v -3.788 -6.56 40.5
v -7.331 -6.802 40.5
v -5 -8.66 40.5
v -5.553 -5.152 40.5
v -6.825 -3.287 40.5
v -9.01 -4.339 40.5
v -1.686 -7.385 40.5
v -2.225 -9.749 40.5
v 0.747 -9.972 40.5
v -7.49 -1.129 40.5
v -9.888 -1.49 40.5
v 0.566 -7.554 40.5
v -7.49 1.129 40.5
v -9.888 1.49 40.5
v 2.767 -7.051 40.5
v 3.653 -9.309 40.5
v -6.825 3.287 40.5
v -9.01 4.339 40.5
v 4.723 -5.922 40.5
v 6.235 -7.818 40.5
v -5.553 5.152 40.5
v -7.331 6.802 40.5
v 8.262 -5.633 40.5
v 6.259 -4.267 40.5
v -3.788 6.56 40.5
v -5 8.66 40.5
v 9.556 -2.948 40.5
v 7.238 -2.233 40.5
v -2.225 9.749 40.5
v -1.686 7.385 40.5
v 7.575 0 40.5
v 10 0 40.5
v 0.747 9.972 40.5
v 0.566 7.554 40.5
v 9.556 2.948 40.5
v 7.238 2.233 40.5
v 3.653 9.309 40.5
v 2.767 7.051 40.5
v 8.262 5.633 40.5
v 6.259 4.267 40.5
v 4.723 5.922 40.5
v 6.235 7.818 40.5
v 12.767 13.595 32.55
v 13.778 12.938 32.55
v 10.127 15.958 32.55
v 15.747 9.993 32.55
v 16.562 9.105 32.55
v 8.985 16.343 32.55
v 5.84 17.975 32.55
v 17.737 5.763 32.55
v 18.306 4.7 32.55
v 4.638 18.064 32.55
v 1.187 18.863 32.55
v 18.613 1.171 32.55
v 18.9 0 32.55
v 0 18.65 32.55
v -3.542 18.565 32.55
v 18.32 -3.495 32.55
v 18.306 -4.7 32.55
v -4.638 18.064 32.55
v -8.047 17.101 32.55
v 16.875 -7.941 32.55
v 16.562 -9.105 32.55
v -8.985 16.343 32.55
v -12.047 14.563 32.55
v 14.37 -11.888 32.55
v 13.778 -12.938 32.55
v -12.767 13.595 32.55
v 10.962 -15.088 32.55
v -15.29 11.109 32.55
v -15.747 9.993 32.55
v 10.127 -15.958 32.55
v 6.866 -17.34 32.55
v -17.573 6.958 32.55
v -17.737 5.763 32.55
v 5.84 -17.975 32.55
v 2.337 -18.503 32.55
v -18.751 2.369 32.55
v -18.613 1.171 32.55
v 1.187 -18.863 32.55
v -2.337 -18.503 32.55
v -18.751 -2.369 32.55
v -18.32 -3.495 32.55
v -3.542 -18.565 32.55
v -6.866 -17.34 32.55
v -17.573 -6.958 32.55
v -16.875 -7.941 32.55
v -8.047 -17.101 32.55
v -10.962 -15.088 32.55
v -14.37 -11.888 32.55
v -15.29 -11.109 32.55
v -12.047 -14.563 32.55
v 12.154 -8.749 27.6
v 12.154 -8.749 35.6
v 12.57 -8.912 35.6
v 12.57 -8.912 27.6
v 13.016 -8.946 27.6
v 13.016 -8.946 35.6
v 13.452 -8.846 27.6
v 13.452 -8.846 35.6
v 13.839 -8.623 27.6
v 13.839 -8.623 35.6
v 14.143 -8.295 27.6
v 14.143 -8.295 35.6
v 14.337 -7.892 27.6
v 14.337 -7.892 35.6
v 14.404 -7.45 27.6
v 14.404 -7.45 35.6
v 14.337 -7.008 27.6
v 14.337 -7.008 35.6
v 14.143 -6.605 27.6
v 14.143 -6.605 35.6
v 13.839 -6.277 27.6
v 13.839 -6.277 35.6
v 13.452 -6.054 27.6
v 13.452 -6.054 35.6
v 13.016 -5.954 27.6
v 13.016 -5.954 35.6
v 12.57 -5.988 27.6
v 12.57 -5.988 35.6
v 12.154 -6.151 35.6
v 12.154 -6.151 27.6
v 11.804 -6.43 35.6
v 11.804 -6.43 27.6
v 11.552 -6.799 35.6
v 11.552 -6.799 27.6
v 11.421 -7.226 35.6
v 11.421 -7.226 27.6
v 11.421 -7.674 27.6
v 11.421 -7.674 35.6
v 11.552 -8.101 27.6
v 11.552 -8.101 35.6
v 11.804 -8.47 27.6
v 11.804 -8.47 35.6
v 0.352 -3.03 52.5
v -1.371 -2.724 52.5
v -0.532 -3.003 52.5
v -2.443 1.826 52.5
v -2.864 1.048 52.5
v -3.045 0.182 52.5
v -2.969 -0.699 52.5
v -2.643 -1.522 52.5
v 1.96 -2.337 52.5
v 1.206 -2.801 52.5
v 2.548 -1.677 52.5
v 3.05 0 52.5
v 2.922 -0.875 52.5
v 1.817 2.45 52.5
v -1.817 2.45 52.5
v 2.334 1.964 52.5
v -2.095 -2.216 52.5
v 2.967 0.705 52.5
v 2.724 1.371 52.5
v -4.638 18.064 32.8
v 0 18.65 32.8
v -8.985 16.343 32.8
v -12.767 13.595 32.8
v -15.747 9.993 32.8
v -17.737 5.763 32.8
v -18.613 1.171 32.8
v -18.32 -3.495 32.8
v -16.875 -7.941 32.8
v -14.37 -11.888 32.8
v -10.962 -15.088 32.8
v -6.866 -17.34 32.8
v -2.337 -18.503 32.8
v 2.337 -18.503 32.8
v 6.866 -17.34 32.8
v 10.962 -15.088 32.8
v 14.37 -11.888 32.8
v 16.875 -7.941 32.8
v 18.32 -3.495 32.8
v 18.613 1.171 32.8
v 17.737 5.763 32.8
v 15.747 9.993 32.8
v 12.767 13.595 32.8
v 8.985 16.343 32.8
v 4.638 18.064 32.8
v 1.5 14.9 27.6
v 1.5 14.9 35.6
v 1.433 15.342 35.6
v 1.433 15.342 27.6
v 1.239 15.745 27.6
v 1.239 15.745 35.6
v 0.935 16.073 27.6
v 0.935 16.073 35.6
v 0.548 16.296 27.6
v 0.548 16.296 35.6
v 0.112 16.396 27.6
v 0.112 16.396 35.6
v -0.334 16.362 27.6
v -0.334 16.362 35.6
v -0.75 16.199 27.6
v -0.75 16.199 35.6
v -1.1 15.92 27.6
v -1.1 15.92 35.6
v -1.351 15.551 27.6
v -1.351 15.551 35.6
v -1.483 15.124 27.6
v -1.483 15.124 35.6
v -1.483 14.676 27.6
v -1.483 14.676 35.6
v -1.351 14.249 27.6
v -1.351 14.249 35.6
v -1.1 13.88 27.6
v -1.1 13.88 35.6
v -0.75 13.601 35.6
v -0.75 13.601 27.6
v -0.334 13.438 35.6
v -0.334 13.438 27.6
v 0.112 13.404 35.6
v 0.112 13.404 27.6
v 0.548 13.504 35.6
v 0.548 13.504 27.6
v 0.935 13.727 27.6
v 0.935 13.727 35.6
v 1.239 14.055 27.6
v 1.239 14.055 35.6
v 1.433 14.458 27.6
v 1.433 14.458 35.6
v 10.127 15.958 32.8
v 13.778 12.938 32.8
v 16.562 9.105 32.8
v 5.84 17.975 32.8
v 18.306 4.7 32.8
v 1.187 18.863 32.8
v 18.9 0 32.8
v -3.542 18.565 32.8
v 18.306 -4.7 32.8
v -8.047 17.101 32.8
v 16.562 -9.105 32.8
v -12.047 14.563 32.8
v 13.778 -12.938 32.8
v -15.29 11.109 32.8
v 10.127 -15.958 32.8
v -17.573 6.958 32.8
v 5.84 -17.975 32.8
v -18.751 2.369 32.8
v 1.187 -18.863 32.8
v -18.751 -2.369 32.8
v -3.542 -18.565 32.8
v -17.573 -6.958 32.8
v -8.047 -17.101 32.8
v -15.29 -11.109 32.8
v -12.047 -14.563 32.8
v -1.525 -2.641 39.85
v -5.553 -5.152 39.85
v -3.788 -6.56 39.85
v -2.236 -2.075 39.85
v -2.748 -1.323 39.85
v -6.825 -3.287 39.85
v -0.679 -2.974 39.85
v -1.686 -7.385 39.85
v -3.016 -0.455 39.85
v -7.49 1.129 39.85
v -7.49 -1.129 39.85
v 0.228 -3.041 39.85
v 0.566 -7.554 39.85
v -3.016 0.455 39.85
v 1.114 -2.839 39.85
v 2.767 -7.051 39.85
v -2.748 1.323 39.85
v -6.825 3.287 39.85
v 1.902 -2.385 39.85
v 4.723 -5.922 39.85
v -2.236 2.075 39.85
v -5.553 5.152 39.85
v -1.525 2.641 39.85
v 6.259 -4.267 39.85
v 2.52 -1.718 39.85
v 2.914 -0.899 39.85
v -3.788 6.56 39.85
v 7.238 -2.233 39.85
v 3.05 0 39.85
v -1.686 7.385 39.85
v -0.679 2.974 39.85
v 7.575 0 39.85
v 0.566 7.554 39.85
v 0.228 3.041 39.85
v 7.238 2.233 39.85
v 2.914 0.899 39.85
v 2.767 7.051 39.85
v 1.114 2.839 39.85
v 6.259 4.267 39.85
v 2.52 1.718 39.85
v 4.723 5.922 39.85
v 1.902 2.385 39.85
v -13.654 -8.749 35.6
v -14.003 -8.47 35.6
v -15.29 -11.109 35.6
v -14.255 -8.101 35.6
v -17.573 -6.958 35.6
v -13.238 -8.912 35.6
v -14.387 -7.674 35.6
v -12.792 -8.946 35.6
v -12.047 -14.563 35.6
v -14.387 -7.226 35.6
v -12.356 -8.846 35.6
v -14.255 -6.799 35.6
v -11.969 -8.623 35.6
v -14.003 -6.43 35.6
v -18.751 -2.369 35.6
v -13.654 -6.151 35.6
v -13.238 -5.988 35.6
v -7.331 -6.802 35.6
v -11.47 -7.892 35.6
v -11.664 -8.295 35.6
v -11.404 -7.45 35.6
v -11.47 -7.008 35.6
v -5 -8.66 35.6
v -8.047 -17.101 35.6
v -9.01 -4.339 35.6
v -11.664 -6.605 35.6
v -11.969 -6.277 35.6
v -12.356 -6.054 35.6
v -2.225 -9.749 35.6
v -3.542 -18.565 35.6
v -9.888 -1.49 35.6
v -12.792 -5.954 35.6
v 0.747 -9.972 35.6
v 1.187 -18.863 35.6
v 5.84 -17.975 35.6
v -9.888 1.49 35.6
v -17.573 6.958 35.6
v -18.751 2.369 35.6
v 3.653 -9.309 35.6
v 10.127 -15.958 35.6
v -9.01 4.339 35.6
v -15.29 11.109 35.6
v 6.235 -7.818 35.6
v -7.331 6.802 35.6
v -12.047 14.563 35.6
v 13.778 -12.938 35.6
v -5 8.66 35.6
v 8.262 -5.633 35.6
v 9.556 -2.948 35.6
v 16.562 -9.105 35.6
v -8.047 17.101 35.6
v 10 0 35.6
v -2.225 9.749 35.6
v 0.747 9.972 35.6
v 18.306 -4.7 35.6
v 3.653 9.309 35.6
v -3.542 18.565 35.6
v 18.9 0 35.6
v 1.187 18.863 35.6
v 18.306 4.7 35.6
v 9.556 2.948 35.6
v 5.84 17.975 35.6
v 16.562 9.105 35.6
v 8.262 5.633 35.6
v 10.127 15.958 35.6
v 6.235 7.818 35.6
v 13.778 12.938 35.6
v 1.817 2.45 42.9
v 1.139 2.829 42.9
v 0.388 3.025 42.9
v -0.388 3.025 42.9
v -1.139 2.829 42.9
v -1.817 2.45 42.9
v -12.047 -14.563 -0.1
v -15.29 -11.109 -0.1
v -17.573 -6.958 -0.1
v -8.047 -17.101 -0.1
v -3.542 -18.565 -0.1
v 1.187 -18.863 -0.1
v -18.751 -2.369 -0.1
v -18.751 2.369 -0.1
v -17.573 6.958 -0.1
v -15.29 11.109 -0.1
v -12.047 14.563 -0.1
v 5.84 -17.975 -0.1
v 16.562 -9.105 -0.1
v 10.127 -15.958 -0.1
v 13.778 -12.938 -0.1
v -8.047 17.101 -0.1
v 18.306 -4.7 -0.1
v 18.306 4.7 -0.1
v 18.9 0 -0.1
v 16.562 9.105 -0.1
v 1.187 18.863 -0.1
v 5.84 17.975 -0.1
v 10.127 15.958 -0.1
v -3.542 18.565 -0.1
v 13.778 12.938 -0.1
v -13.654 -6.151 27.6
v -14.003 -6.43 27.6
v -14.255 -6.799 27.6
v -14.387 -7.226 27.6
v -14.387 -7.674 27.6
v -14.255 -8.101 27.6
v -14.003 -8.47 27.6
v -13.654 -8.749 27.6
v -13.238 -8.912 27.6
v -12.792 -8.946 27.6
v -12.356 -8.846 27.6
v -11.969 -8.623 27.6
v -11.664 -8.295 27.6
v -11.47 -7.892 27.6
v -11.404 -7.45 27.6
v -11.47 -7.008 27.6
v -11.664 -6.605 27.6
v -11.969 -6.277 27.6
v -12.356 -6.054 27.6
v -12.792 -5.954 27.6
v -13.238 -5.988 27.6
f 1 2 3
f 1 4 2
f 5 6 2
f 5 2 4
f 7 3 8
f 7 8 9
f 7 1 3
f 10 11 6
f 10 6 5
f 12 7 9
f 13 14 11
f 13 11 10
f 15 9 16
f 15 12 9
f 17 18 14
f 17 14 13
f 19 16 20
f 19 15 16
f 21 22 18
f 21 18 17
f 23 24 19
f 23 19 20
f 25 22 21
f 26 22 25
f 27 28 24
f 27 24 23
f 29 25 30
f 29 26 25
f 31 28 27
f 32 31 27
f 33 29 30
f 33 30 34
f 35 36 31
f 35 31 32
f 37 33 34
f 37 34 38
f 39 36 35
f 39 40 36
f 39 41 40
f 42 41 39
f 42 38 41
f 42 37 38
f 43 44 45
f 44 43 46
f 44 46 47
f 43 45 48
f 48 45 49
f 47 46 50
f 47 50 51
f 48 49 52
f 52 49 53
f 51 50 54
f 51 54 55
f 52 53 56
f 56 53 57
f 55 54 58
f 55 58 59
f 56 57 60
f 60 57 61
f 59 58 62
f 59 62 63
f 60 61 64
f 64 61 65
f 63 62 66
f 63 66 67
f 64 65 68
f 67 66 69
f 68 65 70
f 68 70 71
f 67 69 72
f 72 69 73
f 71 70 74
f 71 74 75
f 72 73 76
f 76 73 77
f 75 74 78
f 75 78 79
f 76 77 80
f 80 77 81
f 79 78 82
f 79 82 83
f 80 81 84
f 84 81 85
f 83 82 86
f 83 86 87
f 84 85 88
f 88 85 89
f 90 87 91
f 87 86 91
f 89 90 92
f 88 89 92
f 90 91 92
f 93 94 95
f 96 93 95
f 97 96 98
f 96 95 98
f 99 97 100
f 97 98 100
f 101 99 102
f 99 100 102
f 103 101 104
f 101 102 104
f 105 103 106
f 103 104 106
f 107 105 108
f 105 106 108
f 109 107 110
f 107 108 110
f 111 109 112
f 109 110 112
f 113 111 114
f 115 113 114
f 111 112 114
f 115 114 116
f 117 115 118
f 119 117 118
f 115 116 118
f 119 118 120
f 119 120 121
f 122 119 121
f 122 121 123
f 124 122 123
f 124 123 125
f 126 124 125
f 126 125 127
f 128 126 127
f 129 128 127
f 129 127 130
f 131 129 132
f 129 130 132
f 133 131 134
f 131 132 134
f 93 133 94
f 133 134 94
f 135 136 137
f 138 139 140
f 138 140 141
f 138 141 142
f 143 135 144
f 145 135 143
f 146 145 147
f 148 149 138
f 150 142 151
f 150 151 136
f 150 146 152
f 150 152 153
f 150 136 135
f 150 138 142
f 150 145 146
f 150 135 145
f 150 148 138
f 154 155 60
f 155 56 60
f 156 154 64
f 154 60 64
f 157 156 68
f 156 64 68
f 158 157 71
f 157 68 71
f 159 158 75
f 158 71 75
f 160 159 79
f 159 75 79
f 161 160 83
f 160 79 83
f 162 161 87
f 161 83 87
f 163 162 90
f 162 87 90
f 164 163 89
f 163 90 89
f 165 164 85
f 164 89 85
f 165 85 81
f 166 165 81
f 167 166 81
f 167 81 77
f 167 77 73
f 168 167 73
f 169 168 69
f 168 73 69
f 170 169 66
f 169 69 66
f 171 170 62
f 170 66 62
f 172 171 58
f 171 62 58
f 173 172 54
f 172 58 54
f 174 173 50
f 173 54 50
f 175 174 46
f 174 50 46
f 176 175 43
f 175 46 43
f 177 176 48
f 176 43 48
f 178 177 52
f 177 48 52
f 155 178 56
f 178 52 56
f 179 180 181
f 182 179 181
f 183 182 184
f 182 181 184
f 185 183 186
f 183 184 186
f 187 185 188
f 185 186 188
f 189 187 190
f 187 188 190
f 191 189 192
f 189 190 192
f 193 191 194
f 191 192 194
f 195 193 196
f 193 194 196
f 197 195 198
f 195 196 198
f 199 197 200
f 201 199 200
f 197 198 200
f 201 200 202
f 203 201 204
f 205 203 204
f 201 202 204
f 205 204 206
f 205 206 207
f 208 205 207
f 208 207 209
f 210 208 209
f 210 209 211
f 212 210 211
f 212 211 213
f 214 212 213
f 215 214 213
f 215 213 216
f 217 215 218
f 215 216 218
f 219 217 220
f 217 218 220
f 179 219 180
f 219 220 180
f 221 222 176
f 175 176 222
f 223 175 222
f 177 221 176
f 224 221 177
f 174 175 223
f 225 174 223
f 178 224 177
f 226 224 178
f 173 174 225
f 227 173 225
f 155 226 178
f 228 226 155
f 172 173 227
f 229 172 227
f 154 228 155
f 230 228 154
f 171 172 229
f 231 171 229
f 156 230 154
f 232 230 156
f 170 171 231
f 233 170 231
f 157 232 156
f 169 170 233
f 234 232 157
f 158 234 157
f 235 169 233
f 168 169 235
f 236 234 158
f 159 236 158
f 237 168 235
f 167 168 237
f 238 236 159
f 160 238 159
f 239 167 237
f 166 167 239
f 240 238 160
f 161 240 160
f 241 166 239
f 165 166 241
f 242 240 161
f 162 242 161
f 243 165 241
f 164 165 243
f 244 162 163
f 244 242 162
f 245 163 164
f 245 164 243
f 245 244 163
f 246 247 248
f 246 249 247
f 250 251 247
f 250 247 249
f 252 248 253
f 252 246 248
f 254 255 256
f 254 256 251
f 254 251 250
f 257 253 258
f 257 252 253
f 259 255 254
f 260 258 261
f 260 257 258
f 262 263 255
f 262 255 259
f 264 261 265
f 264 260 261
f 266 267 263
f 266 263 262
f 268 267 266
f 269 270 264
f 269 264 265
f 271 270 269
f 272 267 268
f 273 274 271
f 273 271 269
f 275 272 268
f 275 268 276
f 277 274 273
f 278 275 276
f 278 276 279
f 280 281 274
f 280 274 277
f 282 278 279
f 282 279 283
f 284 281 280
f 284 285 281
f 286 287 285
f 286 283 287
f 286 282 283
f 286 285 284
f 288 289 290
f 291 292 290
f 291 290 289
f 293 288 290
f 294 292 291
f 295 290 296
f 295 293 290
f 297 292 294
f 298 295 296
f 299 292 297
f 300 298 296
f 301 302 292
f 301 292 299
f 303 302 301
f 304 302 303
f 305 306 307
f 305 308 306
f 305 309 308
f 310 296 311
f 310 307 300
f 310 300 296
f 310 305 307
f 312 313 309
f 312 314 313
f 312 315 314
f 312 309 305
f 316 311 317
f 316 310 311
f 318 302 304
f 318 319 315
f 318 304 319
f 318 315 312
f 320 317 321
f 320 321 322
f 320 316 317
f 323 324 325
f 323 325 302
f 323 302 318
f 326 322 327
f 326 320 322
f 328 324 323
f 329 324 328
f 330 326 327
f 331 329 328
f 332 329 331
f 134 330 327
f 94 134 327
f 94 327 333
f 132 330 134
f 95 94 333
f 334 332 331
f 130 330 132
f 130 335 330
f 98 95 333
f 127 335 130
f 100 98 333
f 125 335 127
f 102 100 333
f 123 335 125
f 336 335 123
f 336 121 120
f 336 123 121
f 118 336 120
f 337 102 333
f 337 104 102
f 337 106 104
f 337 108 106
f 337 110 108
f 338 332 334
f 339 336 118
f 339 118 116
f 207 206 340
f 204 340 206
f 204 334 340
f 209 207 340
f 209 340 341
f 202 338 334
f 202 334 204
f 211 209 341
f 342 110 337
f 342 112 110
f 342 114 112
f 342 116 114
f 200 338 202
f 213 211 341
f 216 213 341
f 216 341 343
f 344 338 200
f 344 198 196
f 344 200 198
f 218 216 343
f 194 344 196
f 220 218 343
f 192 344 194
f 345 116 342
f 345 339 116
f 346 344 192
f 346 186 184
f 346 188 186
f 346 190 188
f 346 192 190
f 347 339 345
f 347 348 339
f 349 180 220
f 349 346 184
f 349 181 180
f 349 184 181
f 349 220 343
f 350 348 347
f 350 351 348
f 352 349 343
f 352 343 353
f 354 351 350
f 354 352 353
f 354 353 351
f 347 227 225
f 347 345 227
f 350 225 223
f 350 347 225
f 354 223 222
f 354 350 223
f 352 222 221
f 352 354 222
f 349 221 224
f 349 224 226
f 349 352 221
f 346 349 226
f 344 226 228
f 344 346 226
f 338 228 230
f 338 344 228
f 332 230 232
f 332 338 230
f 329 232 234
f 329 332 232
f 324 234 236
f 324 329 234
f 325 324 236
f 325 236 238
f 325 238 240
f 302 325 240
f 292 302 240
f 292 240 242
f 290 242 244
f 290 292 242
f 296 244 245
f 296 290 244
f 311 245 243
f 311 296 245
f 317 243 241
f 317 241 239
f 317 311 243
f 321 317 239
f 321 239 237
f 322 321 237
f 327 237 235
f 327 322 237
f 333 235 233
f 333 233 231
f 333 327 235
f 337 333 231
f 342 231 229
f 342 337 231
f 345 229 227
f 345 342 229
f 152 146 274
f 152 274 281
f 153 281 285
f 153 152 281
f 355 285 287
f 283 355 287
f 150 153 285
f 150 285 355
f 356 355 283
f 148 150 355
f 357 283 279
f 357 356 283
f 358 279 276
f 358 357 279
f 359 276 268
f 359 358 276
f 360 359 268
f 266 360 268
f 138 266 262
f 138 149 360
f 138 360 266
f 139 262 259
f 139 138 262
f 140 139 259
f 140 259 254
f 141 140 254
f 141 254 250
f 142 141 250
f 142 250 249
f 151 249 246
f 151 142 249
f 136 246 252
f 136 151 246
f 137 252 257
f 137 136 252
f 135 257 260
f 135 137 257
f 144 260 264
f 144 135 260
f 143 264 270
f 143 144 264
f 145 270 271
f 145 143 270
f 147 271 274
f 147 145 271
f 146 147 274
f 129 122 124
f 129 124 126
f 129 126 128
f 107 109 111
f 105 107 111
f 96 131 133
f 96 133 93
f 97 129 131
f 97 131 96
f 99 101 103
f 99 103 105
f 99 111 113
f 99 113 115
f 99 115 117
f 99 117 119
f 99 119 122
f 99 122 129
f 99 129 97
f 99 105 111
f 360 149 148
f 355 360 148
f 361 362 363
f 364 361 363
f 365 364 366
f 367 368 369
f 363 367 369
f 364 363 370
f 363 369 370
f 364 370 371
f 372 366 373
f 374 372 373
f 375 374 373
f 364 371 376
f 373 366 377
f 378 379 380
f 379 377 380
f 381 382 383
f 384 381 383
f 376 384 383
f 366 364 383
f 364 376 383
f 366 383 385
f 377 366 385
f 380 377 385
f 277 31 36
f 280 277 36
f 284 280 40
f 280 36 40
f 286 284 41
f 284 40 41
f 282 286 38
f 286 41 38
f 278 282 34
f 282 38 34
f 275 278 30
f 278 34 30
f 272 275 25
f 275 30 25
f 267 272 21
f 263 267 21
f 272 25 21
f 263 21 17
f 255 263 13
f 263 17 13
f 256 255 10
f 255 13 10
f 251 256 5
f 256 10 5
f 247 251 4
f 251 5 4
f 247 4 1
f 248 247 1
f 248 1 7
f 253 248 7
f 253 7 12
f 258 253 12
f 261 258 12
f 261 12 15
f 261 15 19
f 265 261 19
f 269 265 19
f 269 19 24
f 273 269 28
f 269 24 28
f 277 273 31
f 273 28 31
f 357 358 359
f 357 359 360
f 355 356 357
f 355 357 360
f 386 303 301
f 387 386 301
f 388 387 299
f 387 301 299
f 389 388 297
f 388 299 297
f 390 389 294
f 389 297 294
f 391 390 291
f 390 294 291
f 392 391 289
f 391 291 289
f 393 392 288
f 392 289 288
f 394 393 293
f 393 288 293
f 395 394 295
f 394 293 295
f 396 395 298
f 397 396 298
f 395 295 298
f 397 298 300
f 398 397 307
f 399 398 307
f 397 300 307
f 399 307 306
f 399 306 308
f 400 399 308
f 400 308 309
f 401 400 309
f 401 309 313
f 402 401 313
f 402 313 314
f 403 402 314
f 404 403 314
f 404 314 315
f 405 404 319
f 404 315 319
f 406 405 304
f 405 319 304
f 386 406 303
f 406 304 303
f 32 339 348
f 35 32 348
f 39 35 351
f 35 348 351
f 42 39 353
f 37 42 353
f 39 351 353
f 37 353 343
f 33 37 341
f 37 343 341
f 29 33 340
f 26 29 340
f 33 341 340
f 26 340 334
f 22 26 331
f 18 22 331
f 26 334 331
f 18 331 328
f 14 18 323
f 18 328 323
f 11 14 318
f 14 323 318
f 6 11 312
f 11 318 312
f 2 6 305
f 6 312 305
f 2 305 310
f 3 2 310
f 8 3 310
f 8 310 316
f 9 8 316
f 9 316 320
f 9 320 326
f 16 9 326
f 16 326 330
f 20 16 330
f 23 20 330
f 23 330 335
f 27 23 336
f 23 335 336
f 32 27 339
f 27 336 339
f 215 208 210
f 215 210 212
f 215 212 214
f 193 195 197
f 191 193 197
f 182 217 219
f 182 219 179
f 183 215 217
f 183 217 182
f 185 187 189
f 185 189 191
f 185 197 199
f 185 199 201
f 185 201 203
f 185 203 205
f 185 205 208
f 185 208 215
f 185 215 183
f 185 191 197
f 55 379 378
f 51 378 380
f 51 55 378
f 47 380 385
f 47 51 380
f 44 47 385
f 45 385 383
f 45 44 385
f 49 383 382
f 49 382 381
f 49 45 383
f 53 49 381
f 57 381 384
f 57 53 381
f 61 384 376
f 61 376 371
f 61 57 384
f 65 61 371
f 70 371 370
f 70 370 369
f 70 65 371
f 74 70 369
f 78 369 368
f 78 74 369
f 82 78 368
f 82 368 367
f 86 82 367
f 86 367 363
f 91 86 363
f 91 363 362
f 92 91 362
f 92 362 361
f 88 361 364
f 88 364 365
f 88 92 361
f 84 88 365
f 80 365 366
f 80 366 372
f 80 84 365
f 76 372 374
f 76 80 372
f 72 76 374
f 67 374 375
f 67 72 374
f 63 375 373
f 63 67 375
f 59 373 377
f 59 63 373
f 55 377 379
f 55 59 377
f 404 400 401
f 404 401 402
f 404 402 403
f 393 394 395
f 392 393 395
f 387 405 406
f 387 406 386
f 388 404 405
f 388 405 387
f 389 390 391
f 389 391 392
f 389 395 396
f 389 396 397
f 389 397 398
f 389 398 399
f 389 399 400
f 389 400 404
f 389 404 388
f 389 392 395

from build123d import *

# Parameters (mm, degrees)
ESQUISSE1_R                  = 18.9
BOSS_EXTRU_1_DEPTH           = 35.6
BOSS_EXTRU_1_DEPTH_BACK      = 0.1
ESQUISSE3_R                  = 10
BOSS_EXTRU_3_DEPTH           = 4.9
ESQUISSE4_R                  = 3.05
BOSS_EXTRU_4_DEPTH           = 12
ESQUISSE5_R                  = 1.5
ENL_V_MAT_EXTRU_1_DEPTH      = 8
ESQUISSE6_R                  = 7.575
ESQUISSE6_R_2                = 3.05
ENL_V_MAT_EXTRU_3_DEPTH      = 0.65
ENL_V_MAT_EXTRU_4_DEPTH      = 9.6
R_P_TITION_CIRCULAIRE1_COUNT = 3
ESQUISSE8_W                  = 0.25
ESQUISSE8_H                  = 3.196164938


with BuildPart() as part:
    # Esquisse1 → Boss.-Extru.1 (new body, two sides)
    with BuildSketch(Plane.XY) as boss_extru_1_sk:
        Circle(ESQUISSE1_R)
    extrude(amount=BOSS_EXTRU_1_DEPTH)
    extrude(boss_extru_1_sk.sketch, amount=-BOSS_EXTRU_1_DEPTH_BACK)

    # Esquisse3 → Boss.-Extru.3 (add)
    with BuildSketch(Plane.XY.offset(35.6)):
        Circle(ESQUISSE3_R)
    extrude(amount=BOSS_EXTRU_3_DEPTH)

    # Esquisse4 → Boss.-Extru.4 (add)
    with BuildSketch(Plane.XY.offset(40.5)):
        Circle(ESQUISSE4_R)
    extrude(amount=BOSS_EXTRU_4_DEPTH)

    # Esquisse5 → Enlèv. mat.-Extru.1 (cut)
    with BuildSketch(Plane.XY.offset(35.6)):
        with Locations((0, 14.9)):
            Circle(ESQUISSE5_R)
    enl_v_mat_extru_1 = extrude(amount=-ENL_V_MAT_EXTRU_1_DEPTH, mode=Mode.SUBTRACT)

    # Esquisse6 → Enlèv. mat.-Extru.3 (cut)
    with BuildSketch(Plane.XY.offset(40.5)):
        Circle(ESQUISSE6_R)
        Circle(ESQUISSE6_R_2, mode=Mode.SUBTRACT)
    extrude(amount=-ENL_V_MAT_EXTRU_3_DEPTH, mode=Mode.SUBTRACT)

    # Esquisse7 → Enlèv. mat.-Extru.4 (cut)
    with BuildSketch(Plane.XY.offset(52.5)):
        Polygon((-4.317069663, 2.45), (4.517863601, 2.45), (1.480855292, 5.48700831), (-3.363298459, 5.48700831), align=None)
    extrude(amount=-ENL_V_MAT_EXTRU_4_DEPTH, mode=Mode.SUBTRACT)

    # Répétition circulaire1: Enlèv. mat.-Extru.1 ×3 about axis
    r_p_tition_circulaire1_axis = Axis((0, 0, 0), (0, 0, 1))
    for i in range(1, R_P_TITION_CIRCULAIRE1_COUNT):
        add(enl_v_mat_extru_1.rotate(r_p_tition_circulaire1_axis, i * 360 / R_P_TITION_CIRCULAIRE1_COUNT), mode=Mode.SUBTRACT)

    # Esquisse8 → Enlèvement de matière-Révolution1 (revolve, cut)
    with BuildSketch(Plane(origin=(0, 0, 0), x_dir=(0, 0, -1), z_dir=(1, 0, 0))):
        with Locations((-32.675, 20.248082469)):
            Rectangle(ESQUISSE8_W, ESQUISSE8_H)
    revolve(axis=Axis((0, 0, -0.1), (0, 0, 1)), mode=Mode.SUBTRACT)


solid = part.part
